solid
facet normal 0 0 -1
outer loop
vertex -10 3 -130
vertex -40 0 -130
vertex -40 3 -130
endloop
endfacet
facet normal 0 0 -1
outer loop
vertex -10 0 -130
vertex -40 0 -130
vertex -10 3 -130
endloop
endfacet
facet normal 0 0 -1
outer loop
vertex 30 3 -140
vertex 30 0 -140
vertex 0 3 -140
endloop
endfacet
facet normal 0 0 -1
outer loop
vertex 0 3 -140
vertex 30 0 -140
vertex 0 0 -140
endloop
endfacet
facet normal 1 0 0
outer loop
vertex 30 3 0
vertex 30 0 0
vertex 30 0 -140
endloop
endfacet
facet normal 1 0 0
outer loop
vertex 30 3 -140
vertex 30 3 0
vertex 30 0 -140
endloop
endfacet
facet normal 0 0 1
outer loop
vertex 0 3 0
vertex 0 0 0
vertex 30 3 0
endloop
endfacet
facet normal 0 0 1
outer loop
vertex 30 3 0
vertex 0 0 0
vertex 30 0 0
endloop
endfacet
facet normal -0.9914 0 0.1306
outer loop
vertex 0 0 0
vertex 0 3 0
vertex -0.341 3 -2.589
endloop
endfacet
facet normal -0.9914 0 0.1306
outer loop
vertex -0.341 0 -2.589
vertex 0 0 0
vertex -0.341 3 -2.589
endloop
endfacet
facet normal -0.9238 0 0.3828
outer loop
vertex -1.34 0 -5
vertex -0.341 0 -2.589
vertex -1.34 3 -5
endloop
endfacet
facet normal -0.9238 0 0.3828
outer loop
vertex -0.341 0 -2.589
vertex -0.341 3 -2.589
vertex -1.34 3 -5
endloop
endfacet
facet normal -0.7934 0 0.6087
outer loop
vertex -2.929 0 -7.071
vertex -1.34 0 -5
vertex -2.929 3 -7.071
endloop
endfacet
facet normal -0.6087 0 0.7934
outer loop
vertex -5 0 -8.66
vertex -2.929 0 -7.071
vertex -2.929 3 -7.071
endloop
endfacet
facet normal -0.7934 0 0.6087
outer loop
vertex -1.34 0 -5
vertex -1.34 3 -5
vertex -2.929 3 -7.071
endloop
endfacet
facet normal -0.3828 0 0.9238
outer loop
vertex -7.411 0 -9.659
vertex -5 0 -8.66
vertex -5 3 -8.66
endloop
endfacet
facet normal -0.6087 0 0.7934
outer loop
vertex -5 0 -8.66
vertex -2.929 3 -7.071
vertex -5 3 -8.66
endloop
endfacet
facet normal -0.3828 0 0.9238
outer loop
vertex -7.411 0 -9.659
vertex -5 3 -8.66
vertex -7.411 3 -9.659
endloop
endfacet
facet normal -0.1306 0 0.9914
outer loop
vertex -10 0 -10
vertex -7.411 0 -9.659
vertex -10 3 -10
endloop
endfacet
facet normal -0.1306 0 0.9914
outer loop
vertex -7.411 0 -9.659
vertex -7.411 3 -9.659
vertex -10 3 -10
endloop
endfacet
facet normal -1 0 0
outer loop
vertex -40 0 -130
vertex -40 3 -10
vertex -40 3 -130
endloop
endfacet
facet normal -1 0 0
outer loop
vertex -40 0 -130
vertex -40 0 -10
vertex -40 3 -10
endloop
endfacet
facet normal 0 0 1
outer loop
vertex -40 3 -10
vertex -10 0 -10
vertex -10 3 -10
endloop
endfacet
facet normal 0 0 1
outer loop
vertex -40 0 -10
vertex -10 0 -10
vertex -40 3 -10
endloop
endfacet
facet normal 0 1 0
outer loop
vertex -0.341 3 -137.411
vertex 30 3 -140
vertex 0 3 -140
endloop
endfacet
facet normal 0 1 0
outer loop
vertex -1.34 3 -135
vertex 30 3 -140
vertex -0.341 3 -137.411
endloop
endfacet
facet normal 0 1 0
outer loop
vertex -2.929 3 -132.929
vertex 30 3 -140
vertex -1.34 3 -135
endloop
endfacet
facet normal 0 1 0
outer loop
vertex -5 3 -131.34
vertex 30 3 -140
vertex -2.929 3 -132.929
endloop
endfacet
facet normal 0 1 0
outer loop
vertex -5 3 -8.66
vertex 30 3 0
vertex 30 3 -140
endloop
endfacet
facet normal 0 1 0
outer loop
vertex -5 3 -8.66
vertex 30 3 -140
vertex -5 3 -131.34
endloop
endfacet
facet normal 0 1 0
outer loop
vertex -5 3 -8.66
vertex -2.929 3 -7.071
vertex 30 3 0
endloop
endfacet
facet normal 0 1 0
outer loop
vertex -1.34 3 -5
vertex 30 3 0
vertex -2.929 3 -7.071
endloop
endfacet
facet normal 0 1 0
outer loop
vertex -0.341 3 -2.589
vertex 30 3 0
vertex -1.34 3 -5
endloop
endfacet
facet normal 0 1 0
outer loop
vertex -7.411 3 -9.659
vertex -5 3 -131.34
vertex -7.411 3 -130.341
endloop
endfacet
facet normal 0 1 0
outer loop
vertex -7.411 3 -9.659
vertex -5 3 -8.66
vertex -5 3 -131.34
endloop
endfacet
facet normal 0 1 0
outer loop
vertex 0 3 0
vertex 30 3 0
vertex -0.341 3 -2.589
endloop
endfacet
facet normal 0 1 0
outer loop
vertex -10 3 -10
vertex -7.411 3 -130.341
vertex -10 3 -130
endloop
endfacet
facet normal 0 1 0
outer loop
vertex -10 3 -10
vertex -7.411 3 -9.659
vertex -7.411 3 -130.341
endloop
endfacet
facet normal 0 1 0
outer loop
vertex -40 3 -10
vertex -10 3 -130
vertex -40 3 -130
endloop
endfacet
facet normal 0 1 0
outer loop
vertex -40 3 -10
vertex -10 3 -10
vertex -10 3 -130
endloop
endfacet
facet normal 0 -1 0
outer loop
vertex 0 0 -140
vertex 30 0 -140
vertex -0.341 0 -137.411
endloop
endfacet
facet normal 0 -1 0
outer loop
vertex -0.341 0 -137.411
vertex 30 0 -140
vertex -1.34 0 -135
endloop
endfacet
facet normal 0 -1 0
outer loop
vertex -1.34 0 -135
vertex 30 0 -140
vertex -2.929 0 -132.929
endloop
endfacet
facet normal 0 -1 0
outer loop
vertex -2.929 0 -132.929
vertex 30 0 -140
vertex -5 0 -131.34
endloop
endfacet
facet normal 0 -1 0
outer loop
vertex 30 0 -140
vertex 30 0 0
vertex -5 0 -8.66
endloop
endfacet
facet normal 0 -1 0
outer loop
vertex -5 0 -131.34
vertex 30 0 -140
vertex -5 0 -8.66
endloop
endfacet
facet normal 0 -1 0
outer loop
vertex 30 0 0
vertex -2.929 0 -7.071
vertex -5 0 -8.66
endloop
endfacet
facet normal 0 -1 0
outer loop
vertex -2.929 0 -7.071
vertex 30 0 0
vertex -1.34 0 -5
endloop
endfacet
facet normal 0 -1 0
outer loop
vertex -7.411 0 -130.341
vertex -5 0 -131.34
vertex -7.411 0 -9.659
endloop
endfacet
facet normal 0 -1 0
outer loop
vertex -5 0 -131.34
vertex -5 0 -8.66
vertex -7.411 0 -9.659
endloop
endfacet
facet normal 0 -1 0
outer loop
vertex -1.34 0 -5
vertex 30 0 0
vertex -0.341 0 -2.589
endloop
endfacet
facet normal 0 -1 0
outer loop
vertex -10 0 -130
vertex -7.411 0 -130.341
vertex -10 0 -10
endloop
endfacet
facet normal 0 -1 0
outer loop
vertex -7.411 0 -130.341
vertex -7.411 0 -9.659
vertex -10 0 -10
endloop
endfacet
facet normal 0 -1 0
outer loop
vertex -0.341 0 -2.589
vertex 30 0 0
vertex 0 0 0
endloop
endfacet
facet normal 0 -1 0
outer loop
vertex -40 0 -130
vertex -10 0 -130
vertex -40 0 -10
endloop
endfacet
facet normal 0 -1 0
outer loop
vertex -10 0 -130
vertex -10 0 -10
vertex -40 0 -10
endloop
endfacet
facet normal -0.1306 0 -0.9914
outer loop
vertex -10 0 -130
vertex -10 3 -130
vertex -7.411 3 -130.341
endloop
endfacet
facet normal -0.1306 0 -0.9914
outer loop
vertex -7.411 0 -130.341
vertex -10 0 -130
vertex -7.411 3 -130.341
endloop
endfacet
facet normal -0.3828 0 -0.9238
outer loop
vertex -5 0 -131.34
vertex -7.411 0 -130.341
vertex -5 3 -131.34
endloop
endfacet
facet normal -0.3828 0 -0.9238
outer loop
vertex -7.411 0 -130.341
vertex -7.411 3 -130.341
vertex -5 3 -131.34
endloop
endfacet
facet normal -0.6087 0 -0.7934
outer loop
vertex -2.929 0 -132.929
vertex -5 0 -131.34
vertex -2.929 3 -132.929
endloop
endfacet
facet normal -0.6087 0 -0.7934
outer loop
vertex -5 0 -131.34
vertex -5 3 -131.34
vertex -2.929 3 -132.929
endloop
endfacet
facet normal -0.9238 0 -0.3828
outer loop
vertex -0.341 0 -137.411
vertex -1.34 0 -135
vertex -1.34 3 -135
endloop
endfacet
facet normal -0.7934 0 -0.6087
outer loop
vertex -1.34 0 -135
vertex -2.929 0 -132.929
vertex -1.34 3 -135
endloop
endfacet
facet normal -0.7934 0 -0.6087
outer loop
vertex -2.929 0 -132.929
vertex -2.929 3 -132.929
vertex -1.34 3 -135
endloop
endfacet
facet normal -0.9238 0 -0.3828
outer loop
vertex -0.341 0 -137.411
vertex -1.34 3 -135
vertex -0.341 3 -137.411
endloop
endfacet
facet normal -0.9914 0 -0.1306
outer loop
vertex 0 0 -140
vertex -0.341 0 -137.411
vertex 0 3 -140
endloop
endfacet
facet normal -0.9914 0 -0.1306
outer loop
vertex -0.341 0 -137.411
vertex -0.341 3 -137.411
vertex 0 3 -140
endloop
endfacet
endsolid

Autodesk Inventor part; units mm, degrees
ref_plane "YZ Plane" through (0, 0, 0) normal (1, 0, 0) x (0, 1, 0)
ref_plane "XZ Plane" through (0, 0, 0) normal (0, 1, 0) x (-1, 0, 0)
ref_plane "XY Plane" through (0, 0, 0) normal (0, 0, 1) x (1, 0, 0)
sketch "Sketch1" plane through (0, 0, 0) normal (0, 1, 0) x (-1, 0, 0)
  line L0 (0, 0) -> (-30, 0)
  line L1 (-30, 0) -> (-30, -140)
  line L2 (-30, -140) -> (0, -140)
  line L3 (0, -140) -> (0, 0)
  line L4 (0, 0) -> (0, -10)
  line L5 (0, -10) -> (40, -10)
  line L6 (40, -10) -> (40, -130)
  line L7 (40, -130) -> (0, -130)
  line L8 (0, -130) -> (0, -10)
  point P0 (0, -130)
  dimension "d0" = 30
  dimension "d1" = 140
  dimension "d2" = 10
  dimension "d3" = 40
  dimension "d4" = 120
extrude "Extrusion1" add sketch "Sketch1" along normal blind 3
fillet "Fillet1" radius 10 2 edges at (0, 1.5, -10) (0, 1.5, -130)
properties part number "lateral_base"
